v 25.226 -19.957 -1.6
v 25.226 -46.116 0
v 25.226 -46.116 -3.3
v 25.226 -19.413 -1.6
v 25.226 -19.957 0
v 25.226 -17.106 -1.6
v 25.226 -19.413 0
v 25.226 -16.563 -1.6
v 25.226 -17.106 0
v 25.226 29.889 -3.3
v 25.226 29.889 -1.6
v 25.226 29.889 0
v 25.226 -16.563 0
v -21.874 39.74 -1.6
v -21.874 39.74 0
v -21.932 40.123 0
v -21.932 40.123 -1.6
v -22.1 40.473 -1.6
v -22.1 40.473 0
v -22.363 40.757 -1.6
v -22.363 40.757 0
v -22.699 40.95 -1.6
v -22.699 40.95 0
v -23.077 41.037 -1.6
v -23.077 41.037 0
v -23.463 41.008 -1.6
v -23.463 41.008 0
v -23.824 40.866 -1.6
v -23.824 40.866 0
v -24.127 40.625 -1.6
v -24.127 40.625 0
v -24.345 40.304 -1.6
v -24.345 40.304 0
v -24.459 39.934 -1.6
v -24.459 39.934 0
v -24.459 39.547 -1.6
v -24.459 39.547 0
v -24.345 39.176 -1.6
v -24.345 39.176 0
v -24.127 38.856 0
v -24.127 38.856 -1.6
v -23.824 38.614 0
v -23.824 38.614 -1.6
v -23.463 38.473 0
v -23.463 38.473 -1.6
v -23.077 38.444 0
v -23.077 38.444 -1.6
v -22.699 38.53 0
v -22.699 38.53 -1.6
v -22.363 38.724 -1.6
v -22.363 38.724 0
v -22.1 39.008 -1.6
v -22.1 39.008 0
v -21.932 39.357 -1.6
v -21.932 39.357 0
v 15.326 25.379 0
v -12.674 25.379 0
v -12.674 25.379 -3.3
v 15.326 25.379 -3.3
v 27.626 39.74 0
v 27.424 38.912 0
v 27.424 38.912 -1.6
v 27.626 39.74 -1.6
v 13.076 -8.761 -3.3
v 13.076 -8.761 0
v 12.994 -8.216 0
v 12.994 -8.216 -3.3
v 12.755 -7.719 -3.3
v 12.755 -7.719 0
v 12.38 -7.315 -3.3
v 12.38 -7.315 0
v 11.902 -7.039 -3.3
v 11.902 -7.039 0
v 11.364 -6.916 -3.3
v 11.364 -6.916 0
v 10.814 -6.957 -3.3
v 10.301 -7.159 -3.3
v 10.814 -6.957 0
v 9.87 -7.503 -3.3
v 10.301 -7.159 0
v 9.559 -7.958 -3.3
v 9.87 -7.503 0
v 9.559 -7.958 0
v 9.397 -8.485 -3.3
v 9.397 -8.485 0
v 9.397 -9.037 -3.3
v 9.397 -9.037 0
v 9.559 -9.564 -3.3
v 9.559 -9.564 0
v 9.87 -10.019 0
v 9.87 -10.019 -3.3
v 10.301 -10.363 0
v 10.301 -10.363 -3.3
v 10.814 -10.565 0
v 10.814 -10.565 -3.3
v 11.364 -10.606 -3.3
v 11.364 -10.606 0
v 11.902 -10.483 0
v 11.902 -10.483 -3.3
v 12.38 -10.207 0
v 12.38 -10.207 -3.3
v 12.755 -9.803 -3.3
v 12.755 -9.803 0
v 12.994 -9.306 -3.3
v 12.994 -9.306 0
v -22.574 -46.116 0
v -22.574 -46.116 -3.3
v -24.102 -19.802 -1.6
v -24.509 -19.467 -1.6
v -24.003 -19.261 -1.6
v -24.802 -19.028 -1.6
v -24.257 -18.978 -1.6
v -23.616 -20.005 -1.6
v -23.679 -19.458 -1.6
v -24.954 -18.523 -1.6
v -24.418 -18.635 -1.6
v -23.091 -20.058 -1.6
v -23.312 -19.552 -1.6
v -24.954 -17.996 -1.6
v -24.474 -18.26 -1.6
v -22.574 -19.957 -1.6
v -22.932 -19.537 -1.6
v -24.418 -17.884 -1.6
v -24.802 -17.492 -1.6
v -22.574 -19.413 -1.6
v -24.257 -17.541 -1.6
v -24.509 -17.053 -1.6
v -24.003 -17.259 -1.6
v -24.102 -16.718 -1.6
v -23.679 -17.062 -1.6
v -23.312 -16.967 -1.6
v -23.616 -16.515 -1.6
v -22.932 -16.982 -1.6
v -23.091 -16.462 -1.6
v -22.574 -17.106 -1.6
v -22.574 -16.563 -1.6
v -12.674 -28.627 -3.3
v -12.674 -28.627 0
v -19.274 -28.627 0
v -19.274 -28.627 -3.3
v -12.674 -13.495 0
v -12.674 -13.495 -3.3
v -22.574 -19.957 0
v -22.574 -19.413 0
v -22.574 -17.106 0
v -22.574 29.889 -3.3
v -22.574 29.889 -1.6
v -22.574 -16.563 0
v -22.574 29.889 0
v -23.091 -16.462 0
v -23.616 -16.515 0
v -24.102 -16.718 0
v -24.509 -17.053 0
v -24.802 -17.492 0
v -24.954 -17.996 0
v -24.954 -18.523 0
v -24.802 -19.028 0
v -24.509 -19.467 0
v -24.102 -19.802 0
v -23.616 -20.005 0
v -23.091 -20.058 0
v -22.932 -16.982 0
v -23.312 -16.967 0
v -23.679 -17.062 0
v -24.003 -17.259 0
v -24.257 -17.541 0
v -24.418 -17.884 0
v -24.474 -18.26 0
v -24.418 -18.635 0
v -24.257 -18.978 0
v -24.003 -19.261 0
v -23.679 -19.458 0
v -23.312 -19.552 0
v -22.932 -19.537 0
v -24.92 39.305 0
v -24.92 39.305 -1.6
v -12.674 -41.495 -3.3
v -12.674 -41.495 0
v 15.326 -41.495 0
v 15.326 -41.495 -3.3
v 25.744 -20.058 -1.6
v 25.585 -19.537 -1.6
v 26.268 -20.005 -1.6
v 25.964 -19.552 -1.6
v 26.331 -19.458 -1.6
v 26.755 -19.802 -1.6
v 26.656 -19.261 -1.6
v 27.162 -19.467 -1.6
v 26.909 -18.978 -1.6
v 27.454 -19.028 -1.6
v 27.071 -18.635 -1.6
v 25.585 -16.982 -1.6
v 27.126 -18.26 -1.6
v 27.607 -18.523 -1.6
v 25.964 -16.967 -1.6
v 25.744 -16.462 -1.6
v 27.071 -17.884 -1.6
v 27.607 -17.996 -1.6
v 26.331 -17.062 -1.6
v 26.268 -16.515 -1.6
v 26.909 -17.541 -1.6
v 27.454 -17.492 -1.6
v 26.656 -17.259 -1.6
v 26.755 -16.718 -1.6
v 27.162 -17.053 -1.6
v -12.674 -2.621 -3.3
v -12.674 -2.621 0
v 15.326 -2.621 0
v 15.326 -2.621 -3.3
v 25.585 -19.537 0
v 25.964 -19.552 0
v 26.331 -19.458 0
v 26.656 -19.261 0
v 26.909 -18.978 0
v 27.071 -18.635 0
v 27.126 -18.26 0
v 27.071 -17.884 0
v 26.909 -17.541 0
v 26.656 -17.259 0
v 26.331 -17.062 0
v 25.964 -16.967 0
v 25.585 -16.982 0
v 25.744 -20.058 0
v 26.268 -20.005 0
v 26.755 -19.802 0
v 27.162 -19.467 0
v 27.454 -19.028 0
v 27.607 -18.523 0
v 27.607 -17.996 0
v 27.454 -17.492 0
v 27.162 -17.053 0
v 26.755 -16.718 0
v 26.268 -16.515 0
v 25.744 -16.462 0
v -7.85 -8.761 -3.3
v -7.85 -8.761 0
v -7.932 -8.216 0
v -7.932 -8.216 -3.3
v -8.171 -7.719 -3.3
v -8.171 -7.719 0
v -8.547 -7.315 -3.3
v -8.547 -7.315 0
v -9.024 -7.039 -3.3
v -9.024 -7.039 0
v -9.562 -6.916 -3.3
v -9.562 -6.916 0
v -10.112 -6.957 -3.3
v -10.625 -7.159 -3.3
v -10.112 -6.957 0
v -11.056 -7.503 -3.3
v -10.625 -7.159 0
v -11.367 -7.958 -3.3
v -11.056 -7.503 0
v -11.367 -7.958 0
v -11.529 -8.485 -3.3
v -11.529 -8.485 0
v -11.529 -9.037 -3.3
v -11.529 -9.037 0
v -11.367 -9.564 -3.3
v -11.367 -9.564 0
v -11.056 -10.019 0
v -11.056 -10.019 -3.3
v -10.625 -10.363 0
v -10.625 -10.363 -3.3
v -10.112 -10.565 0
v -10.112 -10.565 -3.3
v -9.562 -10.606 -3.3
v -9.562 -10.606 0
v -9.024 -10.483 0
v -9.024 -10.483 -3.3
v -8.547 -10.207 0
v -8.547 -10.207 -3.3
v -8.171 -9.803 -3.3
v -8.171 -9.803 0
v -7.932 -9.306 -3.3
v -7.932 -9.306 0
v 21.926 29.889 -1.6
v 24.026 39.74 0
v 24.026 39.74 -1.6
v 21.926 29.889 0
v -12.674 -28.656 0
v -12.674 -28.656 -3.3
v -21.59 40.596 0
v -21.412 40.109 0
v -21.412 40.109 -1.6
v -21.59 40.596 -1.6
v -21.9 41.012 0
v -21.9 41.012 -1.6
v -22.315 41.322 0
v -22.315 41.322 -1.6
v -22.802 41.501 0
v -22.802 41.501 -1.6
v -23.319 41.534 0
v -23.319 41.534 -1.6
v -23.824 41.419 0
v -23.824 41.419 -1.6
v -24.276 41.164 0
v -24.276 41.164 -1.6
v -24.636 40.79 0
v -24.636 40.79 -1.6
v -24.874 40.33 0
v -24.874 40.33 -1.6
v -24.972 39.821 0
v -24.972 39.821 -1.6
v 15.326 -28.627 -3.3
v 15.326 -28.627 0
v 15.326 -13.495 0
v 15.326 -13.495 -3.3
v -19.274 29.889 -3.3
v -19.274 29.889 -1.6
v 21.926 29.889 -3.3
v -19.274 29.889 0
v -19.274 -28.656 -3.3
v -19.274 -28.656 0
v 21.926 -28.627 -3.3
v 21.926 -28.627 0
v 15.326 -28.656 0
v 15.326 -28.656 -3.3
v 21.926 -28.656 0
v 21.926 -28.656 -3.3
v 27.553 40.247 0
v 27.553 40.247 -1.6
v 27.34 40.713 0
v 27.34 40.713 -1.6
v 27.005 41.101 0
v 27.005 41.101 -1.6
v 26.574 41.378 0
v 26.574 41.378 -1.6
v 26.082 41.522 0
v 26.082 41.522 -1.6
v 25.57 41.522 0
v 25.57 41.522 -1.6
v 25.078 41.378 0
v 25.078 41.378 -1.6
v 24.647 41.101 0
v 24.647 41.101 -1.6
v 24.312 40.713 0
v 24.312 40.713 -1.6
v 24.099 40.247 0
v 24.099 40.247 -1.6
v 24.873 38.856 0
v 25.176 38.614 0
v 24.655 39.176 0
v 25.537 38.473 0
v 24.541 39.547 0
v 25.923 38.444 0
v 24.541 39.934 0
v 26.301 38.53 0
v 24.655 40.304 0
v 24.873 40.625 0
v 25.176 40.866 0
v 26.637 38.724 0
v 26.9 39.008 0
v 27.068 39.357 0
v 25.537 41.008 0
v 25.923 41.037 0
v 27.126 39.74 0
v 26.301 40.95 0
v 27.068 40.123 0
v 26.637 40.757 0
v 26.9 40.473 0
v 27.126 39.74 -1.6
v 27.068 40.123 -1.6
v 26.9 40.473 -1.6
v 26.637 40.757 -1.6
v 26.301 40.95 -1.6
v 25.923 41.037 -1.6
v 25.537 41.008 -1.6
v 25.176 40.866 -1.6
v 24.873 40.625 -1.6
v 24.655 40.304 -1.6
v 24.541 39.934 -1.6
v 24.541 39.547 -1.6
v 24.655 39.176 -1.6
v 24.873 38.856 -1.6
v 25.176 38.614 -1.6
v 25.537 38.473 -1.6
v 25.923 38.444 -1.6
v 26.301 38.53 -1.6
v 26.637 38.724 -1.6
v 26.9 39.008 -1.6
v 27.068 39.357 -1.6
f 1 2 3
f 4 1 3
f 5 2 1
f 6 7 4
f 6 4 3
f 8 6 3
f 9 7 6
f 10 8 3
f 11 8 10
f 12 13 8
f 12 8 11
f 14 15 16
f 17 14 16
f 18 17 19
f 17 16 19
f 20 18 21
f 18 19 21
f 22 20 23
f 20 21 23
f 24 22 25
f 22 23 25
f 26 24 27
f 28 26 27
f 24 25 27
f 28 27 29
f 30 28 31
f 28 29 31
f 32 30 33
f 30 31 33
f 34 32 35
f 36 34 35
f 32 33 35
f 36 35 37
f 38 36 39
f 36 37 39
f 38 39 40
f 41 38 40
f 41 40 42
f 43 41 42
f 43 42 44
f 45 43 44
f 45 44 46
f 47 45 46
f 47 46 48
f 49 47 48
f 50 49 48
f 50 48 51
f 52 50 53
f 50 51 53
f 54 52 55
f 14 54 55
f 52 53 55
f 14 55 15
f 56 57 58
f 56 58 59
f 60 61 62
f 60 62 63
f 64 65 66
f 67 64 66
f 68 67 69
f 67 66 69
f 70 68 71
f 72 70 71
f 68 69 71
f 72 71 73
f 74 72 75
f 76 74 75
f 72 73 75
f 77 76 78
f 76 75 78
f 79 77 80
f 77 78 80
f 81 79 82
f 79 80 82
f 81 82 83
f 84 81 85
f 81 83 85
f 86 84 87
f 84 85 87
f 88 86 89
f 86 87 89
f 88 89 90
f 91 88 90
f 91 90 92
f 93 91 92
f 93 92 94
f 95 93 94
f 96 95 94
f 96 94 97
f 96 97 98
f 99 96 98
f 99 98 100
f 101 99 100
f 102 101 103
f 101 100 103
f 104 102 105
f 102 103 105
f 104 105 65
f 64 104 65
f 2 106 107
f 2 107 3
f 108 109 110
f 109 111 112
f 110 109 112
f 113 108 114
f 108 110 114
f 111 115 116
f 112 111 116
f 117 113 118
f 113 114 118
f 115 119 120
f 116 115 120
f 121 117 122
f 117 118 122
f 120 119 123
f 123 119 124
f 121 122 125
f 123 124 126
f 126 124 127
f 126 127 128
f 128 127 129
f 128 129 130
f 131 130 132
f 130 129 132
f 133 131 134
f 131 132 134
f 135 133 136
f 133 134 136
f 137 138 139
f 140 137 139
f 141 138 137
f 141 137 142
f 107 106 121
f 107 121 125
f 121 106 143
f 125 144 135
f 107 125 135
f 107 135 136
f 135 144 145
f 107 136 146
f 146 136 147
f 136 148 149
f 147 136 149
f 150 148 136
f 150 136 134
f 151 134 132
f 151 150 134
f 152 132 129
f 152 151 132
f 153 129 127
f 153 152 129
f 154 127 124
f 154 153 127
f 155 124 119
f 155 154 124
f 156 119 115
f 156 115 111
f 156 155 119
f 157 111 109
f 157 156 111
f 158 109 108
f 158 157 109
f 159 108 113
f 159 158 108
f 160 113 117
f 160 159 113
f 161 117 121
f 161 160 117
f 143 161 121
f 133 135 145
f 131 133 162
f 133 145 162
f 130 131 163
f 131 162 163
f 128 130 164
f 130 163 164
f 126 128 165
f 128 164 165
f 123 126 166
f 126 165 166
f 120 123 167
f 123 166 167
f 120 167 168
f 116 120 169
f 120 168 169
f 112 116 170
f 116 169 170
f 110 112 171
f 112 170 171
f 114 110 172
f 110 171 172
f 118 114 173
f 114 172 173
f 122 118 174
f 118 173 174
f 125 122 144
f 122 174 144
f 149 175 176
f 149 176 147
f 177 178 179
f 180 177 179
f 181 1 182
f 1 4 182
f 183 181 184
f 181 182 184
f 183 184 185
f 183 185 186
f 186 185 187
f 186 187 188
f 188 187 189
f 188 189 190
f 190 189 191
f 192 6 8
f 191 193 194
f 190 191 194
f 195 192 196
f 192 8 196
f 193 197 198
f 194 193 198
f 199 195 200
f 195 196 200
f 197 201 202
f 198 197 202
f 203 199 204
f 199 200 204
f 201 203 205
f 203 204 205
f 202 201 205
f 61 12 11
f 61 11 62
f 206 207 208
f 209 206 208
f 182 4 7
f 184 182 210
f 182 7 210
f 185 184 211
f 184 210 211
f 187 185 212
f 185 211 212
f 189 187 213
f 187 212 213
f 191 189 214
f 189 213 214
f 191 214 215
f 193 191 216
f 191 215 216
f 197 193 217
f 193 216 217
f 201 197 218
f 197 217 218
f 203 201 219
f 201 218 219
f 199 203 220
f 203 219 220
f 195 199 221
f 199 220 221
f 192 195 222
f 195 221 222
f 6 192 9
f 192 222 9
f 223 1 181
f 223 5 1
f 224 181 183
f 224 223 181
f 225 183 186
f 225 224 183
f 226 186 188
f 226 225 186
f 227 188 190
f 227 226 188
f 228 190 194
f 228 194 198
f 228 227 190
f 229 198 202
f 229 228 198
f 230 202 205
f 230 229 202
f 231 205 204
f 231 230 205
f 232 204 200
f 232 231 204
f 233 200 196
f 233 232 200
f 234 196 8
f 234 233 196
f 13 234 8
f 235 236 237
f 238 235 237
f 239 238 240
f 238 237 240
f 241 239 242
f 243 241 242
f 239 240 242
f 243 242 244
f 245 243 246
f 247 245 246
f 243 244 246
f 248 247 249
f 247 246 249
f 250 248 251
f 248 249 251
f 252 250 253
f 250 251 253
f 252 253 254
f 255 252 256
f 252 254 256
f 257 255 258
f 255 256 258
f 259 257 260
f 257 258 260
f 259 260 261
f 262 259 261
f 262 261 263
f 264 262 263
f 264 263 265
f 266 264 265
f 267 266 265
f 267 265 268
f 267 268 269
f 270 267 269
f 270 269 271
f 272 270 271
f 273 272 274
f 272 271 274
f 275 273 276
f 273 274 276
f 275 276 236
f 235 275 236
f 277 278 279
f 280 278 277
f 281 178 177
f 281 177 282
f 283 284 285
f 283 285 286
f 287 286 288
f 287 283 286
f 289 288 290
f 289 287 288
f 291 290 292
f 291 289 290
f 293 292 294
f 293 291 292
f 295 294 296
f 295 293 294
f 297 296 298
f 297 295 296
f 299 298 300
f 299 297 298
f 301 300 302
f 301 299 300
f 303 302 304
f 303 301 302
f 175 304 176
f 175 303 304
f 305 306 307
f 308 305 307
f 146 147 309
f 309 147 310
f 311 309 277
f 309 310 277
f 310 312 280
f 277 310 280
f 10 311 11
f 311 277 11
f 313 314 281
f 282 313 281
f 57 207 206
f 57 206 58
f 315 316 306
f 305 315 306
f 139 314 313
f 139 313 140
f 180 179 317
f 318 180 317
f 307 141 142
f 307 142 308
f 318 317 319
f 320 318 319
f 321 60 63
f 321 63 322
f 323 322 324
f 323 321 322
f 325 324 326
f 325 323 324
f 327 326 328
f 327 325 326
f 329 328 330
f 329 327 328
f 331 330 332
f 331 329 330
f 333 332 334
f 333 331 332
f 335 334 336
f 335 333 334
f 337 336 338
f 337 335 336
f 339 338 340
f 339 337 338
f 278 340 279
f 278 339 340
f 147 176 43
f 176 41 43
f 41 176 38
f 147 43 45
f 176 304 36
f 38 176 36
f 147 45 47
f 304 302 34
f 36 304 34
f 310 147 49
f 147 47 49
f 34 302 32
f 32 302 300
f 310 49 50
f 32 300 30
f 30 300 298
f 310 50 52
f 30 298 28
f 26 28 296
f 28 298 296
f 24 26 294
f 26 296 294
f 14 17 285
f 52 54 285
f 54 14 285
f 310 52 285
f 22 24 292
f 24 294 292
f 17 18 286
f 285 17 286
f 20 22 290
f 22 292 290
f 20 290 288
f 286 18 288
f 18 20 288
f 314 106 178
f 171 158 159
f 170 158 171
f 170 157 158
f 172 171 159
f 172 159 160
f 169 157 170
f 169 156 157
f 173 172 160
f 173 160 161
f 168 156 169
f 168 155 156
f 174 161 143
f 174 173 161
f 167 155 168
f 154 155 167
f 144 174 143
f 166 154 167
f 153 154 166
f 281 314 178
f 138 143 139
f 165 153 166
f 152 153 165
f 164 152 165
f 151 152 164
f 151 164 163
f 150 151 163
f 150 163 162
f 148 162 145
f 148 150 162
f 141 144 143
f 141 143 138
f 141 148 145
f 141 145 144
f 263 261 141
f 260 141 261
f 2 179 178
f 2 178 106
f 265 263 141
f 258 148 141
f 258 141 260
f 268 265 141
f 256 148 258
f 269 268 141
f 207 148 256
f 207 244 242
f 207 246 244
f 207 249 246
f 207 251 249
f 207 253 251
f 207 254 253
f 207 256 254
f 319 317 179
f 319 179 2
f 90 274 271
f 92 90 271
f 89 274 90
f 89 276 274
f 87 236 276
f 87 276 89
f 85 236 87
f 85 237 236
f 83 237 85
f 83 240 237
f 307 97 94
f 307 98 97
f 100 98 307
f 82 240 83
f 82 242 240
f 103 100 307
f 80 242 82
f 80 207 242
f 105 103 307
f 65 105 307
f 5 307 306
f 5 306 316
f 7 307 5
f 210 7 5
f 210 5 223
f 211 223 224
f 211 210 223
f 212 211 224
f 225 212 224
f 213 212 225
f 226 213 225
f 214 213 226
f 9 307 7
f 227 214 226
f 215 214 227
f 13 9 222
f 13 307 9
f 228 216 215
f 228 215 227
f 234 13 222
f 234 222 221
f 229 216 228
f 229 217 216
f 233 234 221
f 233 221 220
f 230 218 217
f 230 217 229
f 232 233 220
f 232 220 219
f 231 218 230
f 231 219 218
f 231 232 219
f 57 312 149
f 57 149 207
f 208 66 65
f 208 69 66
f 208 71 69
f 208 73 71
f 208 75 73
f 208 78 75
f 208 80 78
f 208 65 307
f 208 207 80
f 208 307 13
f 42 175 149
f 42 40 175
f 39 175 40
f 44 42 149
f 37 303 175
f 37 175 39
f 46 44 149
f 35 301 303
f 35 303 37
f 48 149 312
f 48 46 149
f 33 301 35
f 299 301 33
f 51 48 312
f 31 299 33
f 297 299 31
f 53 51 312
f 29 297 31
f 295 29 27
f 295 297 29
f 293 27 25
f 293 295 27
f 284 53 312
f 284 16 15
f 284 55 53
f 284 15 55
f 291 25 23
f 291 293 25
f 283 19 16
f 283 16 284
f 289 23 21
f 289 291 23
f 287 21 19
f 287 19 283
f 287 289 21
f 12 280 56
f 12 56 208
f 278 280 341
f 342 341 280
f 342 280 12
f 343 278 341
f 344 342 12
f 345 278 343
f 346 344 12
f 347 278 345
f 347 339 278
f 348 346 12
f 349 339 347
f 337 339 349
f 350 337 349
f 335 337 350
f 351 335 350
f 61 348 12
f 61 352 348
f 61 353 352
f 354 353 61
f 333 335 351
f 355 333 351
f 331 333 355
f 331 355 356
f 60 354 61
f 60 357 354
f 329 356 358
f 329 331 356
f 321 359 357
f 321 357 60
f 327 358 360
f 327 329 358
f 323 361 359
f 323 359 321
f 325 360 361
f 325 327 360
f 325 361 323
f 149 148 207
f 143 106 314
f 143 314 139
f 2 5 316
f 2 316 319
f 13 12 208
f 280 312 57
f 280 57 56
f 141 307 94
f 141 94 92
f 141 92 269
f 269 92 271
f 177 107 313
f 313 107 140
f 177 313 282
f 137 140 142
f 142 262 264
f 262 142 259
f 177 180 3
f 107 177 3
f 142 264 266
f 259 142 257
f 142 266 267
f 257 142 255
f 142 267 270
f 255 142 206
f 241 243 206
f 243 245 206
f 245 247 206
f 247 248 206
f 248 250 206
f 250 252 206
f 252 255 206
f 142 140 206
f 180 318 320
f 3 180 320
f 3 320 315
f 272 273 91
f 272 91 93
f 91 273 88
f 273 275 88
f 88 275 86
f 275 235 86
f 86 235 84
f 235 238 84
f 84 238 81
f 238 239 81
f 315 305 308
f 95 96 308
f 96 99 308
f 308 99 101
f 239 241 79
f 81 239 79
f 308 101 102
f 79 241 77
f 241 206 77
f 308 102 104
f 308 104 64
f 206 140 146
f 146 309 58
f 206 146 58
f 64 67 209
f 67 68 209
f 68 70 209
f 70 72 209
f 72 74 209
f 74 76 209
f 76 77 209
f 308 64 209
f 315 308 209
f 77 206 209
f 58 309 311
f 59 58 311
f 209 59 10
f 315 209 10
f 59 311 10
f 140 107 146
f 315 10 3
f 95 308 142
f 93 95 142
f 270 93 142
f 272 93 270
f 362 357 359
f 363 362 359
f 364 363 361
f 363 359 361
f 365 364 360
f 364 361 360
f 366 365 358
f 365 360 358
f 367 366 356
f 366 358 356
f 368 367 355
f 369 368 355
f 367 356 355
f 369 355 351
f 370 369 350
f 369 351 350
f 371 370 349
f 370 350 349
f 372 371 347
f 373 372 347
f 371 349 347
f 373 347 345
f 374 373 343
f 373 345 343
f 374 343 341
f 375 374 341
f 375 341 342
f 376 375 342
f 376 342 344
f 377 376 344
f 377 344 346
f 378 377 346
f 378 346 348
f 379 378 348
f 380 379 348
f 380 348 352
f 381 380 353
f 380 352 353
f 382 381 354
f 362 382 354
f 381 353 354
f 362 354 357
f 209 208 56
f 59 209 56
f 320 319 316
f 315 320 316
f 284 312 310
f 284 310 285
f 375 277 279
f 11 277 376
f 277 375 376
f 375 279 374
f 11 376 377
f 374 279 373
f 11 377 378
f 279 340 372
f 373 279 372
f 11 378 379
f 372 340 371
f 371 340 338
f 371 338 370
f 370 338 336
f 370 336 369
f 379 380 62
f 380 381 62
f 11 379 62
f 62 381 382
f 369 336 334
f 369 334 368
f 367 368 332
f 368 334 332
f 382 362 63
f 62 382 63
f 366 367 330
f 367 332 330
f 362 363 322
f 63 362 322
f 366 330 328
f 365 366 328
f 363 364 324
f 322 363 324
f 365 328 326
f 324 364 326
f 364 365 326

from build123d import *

# Parameters (mm, degrees)
SKETCH_1_R          = 1.85
EXTRUDE_1_DEPTH     = 3.3
SKETCH_2_W          = 3.3
SKETCH_2_H          = 58.544472475
EXTRUDE_2_DEPTH     = 3.3
EXTRUDE_2_2_DEPTH   = 3.3
SKETCH_3_W          = 47.8
SKETCH_3_H          = 17.46
EXTRUDE_3_DEPTH     = 3.3
SKETCH_4_W          = 28
SKETCH_4_H          = 28
CUT_EXTRUDE_2_DEPTH = 3.3
SKETCH_5_R          = 1.8
SKETCH_5_R_2        = 1.3
EXTRUDE_4_DEPTH     = 1.6


with BuildPart() as part:
    # 草圖1 → 填料-伸長1 (new body)
    with BuildSketch(Plane.XY):
        Polygon((21.926158038, 28.738964578), (21.926158038, -28.626702997), (-19.273841962, -28.626702997), (-19.273841962, 28.738964578), (-19.273841962, 29.888964578), (21.926158038, 29.888964578), align=None)
        with Locations((11.226158038, -8.761035422)):
            Circle(SKETCH_1_R, mode=Mode.SUBTRACT)
        with Locations((-9.7, -8.761035422)):
            Circle(SKETCH_1_R, mode=Mode.SUBTRACT)
    extrude(amount=-EXTRUDE_1_DEPTH)


with BuildPart() as body_2:
    # 草圖2 → 填料-伸長2 (new body)
    with BuildSketch(Plane.XY):
        with Locations((23.576158038, 0.61672834)):
            Rectangle(SKETCH_2_W, SKETCH_2_H)
    extrude(amount=-EXTRUDE_2_DEPTH)



with BuildPart() as body_3:
    # 草圖2 → Extrude 2 2 (new body)
    with BuildSketch(Plane.XY):
        with Locations((-20.923841962, 0.61672834)):
            Rectangle(SKETCH_2_W, SKETCH_2_H)
    extrude(amount=-EXTRUDE_2_2_DEPTH)


with BuildPart() as body_2_1:
    add(body_2.part)

    add(body_3.part)  # 填料-伸長3 merges body 3
    # 草圖3 → 填料-伸長3 (add)
    with BuildSketch(Plane.XY):
        with Locations((1.326158038, -37.385507897)):
            Rectangle(SKETCH_3_W, SKETCH_3_H)
    extrude(amount=-EXTRUDE_3_DEPTH)


with BuildPart() as cut_extrude_2_tool:
    # 草圖4 → 除料-伸長2 (new body)
    with BuildSketch(Plane.XY):
        with Locations((1.326158038, -27.495005481)):
            Rectangle(SKETCH_4_W, SKETCH_4_H)
        with Locations((1.326158038, 11.379364932)):
            Rectangle(SKETCH_4_W, SKETCH_4_H)
    extrude(amount=-CUT_EXTRUDE_2_DEPTH)


with BuildPart() as part_1:
    add(part.part)

    # 除料-伸長2: cut by cut_extrude_2_tool
    add(cut_extrude_2_tool.part, mode=Mode.SUBTRACT)



with BuildPart() as body_2_2:
    add(body_2_1.part)

    # 除料-伸長2: cut by cut_extrude_2_tool
    add(cut_extrude_2_tool.part, mode=Mode.SUBTRACT)


with BuildPart() as part_2:
    add(part_1.part)

    add(body_2_2.part)  # 填料-伸長4 merges body 2
    # 草圖5 → 填料-伸長4 (add)
    with BuildSketch(Plane.XY):
        with Locations((-23.173841962, 39.740306118)):
            Circle(SKETCH_5_R)
        with Locations((-23.173841962, 39.740306118)):
            Circle(SKETCH_5_R_2, mode=Mode.SUBTRACT)
        with BuildLine():
            Line((-24.920422623, 39.305040689), (-22.573841962, 29.888964578))
            Line((-22.573841962, 29.888964578), (-19.273841962, 29.888964578))
            Line((-19.273841962, 29.888964578), (-21.411987289, 40.108909035))
            ThreePointArc((-21.411987289, 40.108909035), (-21.38340369, 39.925591827), (-21.373841962, 39.740306118))
            ThreePointArc((-21.373841962, 39.740306118), (-22.954576359, 37.953710866), (-24.920422623, 39.305040689))
        make_face()
        with BuildLine():
            ThreePointArc((27.626158038, 39.740306118), (25.826158038, 41.540306118), (24.026158038, 39.740306118))
            ThreePointArc((24.026158038, 39.740306118), (25.400100428, 37.991456521), (27.424463497, 38.912405363))
            Line((27.424463497, 38.912405363), (27.626158038, 39.740306118))
        make_face()
        with Locations((25.826158038, 39.740306118)):
            Circle(SKETCH_5_R_2, mode=Mode.SUBTRACT)
        with BuildLine():
            ThreePointArc((27.424463497, 38.912405363), (25.400100428, 37.991456521), (24.026158038, 39.740306118))
            Line((24.026158038, 39.740306118), (21.926158038, 29.888964578))
            Line((21.926158038, 29.888964578), (25.226158038, 29.888964578))
            Line((25.226158038, 29.888964578), (27.424463497, 38.912405363))
        make_face()
        with Locations((-23.173841962, -18.259693882)):
            Circle(SKETCH_5_R)
        with Locations((-23.173841962, -18.259693882)):
            Circle(SKETCH_5_R_2, mode=Mode.SUBTRACT)
        with Locations((25.826158038, -18.259693882)):
            Circle(SKETCH_5_R)
        with Locations((25.826158038, -18.259693882)):
            Circle(SKETCH_5_R_2, mode=Mode.SUBTRACT)
    extrude(amount=-EXTRUDE_4_DEPTH)


solid = part_2.part
